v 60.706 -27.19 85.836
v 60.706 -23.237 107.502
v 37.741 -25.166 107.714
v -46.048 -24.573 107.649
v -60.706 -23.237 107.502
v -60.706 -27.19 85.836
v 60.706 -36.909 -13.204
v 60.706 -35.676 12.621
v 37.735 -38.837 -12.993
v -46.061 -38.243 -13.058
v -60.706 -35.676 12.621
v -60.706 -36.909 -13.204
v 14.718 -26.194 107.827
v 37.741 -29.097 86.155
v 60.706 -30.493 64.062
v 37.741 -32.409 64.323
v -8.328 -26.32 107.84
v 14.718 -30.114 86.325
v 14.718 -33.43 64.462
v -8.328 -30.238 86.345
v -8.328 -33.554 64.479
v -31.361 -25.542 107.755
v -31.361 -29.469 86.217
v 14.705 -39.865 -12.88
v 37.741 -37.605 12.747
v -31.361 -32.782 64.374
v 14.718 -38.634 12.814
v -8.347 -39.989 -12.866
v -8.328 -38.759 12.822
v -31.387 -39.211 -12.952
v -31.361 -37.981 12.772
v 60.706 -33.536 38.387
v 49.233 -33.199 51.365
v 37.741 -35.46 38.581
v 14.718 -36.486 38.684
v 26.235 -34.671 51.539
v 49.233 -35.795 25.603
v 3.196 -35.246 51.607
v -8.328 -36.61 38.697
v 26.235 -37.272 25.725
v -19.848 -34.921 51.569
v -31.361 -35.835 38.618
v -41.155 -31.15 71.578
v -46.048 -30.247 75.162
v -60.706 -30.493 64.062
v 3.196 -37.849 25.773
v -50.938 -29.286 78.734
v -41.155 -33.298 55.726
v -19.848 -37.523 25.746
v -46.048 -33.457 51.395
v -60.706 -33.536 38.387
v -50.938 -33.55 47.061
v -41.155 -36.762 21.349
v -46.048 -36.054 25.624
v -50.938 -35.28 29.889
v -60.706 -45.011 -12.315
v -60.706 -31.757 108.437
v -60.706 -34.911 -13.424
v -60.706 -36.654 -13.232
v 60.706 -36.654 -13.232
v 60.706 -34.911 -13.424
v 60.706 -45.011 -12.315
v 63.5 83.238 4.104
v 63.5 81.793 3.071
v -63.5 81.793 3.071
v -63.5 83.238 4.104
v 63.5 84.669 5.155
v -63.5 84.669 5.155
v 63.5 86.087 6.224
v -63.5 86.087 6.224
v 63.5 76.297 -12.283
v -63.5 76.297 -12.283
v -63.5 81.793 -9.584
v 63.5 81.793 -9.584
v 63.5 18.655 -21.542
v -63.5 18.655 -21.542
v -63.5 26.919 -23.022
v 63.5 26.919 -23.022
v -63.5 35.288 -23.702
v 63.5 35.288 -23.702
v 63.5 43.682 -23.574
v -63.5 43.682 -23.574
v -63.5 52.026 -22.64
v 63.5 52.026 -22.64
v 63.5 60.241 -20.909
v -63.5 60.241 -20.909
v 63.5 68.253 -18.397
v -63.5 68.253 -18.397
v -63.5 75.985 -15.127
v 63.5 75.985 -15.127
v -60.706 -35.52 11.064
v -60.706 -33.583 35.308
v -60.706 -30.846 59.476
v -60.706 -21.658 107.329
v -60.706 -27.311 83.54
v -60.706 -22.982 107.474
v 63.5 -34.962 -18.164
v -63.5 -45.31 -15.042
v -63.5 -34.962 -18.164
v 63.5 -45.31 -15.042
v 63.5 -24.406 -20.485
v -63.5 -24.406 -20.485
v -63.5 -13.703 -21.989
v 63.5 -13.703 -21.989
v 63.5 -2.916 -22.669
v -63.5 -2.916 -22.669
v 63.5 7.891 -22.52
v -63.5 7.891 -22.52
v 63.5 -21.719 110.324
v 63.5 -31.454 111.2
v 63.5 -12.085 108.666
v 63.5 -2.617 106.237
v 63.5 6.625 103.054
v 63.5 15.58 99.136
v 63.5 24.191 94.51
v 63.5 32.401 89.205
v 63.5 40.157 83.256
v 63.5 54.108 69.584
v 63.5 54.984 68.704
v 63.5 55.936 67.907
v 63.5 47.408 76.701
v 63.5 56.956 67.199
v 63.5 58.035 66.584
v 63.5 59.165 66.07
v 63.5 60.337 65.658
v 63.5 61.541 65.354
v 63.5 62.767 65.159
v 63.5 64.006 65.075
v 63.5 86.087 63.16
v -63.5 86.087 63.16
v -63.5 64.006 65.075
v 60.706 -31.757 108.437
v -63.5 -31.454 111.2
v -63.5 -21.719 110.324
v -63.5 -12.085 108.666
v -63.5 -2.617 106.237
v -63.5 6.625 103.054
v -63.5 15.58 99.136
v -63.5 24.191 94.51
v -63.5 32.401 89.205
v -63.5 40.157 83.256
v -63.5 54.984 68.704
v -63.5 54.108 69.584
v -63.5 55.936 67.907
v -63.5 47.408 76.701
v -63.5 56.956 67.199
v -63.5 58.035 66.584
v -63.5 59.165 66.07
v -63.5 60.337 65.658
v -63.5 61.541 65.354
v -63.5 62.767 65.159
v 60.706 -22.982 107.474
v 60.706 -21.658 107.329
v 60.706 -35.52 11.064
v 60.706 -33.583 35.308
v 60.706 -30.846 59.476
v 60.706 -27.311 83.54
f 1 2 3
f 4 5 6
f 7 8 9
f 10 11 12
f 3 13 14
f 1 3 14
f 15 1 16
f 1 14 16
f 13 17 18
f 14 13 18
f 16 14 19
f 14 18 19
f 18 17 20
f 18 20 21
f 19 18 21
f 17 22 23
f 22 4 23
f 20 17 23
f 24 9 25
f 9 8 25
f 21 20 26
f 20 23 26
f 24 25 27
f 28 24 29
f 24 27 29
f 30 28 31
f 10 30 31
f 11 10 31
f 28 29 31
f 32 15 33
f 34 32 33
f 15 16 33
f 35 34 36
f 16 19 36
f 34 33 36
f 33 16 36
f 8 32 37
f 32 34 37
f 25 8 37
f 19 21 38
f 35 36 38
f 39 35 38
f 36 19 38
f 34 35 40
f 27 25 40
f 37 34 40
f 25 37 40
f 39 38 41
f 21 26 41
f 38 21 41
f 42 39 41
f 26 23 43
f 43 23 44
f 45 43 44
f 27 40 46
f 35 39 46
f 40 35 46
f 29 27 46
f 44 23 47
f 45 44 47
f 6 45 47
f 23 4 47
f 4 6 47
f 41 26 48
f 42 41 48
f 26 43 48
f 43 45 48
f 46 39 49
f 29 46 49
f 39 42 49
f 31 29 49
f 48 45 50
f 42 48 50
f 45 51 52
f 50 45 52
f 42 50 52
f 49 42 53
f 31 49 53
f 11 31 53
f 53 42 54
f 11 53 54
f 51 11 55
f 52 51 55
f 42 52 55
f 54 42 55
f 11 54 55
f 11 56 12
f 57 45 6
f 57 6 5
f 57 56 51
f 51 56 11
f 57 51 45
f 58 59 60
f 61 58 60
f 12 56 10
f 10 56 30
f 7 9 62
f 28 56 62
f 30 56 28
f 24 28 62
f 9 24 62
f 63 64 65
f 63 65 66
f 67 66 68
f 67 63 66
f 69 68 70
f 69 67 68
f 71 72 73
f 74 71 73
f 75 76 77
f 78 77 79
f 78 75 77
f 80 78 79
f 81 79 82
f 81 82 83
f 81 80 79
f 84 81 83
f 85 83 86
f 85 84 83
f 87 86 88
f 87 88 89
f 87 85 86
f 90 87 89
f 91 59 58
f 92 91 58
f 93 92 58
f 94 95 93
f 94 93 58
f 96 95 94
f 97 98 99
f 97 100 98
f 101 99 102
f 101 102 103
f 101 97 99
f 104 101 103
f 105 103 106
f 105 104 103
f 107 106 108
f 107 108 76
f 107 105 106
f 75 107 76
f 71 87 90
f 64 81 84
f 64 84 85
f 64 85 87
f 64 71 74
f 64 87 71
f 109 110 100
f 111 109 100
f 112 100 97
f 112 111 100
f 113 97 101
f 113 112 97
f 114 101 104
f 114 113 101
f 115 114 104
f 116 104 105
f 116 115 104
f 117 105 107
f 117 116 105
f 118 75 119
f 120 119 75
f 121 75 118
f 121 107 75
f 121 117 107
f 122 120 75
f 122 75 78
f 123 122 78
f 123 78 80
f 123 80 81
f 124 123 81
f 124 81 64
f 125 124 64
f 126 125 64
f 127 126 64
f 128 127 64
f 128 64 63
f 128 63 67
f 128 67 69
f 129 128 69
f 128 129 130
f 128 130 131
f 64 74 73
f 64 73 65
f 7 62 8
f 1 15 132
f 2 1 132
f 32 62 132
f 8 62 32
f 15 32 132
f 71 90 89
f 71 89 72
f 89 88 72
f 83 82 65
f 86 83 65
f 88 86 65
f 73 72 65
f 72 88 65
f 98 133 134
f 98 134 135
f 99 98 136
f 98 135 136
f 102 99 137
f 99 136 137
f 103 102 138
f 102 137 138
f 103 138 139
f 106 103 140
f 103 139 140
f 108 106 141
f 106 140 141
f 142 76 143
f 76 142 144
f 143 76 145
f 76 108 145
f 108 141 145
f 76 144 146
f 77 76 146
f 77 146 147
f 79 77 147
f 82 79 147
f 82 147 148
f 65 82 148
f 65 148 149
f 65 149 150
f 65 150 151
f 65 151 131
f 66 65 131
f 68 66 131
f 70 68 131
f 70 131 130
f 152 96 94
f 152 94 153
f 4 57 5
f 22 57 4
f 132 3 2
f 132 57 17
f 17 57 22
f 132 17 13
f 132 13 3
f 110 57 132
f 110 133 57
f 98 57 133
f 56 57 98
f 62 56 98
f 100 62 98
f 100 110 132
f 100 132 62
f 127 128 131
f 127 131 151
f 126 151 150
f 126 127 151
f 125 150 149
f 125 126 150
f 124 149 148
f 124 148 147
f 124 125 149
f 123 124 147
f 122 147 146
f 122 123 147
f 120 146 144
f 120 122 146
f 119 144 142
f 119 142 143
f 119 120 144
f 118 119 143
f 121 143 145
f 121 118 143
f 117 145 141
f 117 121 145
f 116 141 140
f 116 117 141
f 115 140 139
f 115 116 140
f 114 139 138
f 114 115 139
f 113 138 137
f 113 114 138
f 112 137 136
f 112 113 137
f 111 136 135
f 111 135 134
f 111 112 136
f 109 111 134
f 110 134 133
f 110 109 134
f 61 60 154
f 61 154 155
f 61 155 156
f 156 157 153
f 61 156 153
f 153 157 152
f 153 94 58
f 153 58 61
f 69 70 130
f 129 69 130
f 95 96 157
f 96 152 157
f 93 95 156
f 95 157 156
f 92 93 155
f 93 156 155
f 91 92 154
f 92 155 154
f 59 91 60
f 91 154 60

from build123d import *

# Parameters (mm, degrees)
F1_DEPTH      = 63.5
F1_DEPTH_BACK = 63.5
F2_W          = 121.412
F2_H          = 121.4773469555
F3_DEPTH      = 10.16
F6_ANGLE_BACK = 4.9623752699
F6_ANGLE      = 9.6002572001


with BuildPart() as f1:
    # F0 (on Right) → F1 (new body, two sides)
    with BuildSketch(Plane.YZ) as f1_sk:
        with BuildLine():
            Line((-44.2258762484, -5.1661990916), (-45.3097894054, -15.0418539721))
            ThreePointArc((-45.3097894054, -15.0418539721), (-13.7030518217, -21.9890417418), (18.6550981372, -21.5424884693))
            ThreePointArc((18.6550981372, -21.5424884693), (47.8654596913, -23.2074448835), (75.9852901101, -15.1270711794))
            Line((75.9852901101, -15.1270711794), (76.2974227243, -12.2831957683))
            Line((76.2974227243, -12.2831957683), (81.7933529615, -9.5837377012))
            Line((81.7933529615, -9.5837377012), (81.7933529615, 3.07087185))
            ThreePointArc((81.7933529615, 3.07087185), (83.9552126708, 4.627317683), (86.0872641206, 6.2243516994))
            Line((86.0872641206, 6.2243516994), (86.0872641206, 63.1598830223))
            Line((86.0872641206, 63.1598830223), (64.0061274171, 65.0746673346))
            ThreePointArc((64.0061274171, 65.0746673346), (58.5946758607, 66.3143740435), (54.1078224778, 69.5837512612))
            ThreePointArc((54.1078224778, 69.5837512612), (15.5800187481, 99.1361263011), (-31.4539738675, 111.2000423056))
            Line((-31.4539738675, 111.2000423056), (-43.6588544929, 0))
            Line((-43.6588544929, 0), (-38.2017120719, 0))
            Line((-38.2017120719, 0), (-38.7687338274, -5.1661990916))
            Line((-38.7687338274, -5.1661990916), (-44.2258762484, -5.1661990916))
        make_face()
        Polygon((-43.6588544929, 0), (-44.2258762484, -5.1661990916), (-38.7687338274, -5.1661990916), (-38.2017120719, 0), align=None)
    extrude(amount=F1_DEPTH)
    extrude(f1_sk.sketch, amount=-F1_DEPTH_BACK)

    # F2 (on face) → F3 (cut)
    with BuildSketch(Plane(origin=(0, -43.1391827765, 4.7347875518), x_dir=(1, 0, 0), z_dir=(0, -0.9940306794, 0.1091009097))):
        with Locations((0, 43.5864519963)):
            Rectangle(F2_W, F2_H)
    extrude(amount=-F3_DEPTH, mode=Mode.SUBTRACT)

    # F5 (on offset) → F6 (revolve)
    with BuildSketch(Plane(origin=(0, 4.4781674488, 40.8010881091), x_dir=(1, 0, 0), z_dir=(0, -0.1091009097, -0.9940306794)), mode=Mode.PRIVATE) as f6_sk:
        with BuildLine():
            ThreePointArc((63.1147550677, 37.2976302589), (0, 40.7020876312), (-63.1147550677, 37.2976302589))
            Line((-63.1147550677, 37.2976302589), (63.1147550677, 37.2976302589))
        make_face()
    revolve(f6_sk.sketch.rotate(Axis((60.319211334, 698.4784697554, -35.36966388), (1, 0, 0)), -F6_ANGLE_BACK), axis=Axis((60.319211334, 698.4784697554, -35.36966388), (1, 0, 0)), revolution_arc=F6_ANGLE)


solid = f1.part
